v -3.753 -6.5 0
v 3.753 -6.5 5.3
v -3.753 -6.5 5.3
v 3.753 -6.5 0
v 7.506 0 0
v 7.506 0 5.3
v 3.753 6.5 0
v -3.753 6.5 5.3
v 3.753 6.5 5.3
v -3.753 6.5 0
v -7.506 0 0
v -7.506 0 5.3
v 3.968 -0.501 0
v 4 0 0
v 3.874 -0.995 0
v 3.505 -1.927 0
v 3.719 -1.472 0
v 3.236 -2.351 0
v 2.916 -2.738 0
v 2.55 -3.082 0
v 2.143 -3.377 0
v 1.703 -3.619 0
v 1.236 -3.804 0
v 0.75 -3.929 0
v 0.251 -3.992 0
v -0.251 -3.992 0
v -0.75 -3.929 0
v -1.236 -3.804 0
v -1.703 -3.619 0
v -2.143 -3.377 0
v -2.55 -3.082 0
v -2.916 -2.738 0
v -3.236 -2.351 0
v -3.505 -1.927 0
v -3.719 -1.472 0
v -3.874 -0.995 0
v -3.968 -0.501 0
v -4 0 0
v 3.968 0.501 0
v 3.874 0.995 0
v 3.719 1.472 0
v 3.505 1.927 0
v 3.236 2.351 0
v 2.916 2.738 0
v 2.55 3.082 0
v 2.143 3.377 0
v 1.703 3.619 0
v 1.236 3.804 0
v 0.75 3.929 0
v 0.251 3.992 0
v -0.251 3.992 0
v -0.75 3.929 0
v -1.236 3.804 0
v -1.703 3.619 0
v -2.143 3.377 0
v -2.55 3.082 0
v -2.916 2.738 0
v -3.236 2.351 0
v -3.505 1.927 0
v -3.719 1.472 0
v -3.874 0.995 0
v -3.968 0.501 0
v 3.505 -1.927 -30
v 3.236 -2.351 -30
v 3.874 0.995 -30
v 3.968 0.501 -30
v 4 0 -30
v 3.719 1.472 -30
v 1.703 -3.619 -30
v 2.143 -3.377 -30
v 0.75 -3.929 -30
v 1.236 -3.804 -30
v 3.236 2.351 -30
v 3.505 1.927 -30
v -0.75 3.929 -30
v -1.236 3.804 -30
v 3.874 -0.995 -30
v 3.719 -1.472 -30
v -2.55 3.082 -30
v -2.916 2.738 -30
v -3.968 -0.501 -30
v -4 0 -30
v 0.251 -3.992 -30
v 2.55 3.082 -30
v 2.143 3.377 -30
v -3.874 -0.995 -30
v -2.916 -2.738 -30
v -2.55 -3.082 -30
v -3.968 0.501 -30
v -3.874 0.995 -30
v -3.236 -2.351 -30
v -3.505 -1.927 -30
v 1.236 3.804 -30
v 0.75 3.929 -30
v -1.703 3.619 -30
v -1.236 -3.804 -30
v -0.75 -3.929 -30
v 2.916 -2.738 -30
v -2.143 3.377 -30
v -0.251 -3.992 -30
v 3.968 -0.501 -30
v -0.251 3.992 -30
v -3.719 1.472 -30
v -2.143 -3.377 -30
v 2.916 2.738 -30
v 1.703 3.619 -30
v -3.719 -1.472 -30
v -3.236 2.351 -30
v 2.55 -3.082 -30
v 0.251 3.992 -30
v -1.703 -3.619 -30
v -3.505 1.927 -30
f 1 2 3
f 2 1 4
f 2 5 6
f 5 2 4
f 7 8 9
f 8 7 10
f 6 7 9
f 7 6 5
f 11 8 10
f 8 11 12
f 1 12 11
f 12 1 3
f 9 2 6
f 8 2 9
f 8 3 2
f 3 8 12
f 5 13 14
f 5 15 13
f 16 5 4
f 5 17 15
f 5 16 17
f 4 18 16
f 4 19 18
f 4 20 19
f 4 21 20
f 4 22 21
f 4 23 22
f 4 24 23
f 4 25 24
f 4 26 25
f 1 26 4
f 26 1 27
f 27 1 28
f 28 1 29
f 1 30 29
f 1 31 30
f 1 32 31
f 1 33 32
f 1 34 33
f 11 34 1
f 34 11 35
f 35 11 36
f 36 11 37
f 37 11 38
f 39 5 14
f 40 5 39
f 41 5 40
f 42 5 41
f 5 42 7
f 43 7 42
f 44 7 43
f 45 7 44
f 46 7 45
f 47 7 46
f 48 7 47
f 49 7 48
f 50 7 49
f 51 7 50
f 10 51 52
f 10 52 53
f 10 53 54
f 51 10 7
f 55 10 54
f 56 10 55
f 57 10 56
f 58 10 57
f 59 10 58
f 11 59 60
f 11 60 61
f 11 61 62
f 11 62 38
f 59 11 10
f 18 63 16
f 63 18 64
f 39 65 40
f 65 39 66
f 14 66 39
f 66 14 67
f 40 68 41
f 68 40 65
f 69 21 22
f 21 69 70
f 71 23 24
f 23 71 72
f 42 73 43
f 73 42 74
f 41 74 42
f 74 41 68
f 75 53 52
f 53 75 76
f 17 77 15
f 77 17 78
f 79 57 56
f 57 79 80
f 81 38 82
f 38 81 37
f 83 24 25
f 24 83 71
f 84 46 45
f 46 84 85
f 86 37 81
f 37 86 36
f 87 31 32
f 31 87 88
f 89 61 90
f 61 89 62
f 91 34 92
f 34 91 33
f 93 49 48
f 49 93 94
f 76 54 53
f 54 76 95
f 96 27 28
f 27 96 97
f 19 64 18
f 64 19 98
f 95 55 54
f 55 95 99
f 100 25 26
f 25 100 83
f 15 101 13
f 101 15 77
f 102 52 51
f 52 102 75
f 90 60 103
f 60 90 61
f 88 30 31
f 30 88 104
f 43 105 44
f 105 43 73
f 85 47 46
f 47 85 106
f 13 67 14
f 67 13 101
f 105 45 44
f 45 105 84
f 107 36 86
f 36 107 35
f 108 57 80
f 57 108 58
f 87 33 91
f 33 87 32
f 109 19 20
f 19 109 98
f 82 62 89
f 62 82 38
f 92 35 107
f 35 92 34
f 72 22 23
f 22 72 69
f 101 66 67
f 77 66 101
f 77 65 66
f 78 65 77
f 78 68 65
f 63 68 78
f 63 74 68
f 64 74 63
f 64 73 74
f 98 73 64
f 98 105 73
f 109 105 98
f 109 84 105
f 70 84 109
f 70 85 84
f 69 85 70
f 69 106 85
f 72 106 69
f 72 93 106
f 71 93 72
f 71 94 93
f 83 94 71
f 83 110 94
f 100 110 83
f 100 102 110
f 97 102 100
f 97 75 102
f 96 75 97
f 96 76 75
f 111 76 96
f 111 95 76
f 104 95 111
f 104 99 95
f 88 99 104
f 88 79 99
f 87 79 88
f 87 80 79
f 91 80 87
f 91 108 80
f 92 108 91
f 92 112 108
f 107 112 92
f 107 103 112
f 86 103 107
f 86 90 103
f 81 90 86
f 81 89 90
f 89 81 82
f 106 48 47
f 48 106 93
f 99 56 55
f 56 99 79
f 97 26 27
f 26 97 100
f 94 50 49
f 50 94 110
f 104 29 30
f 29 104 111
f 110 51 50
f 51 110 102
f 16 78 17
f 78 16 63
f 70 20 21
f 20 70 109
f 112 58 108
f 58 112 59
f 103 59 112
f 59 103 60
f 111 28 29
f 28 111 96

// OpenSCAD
$fn = 50;

// 頭部（六角柱）
cylinder(h = 5.3, r = 13 / sqrt(3), $fn = 6);

// シャンク（円柱）
translate([0, 0, -30])
    cylinder(h = 30, d = 8);
